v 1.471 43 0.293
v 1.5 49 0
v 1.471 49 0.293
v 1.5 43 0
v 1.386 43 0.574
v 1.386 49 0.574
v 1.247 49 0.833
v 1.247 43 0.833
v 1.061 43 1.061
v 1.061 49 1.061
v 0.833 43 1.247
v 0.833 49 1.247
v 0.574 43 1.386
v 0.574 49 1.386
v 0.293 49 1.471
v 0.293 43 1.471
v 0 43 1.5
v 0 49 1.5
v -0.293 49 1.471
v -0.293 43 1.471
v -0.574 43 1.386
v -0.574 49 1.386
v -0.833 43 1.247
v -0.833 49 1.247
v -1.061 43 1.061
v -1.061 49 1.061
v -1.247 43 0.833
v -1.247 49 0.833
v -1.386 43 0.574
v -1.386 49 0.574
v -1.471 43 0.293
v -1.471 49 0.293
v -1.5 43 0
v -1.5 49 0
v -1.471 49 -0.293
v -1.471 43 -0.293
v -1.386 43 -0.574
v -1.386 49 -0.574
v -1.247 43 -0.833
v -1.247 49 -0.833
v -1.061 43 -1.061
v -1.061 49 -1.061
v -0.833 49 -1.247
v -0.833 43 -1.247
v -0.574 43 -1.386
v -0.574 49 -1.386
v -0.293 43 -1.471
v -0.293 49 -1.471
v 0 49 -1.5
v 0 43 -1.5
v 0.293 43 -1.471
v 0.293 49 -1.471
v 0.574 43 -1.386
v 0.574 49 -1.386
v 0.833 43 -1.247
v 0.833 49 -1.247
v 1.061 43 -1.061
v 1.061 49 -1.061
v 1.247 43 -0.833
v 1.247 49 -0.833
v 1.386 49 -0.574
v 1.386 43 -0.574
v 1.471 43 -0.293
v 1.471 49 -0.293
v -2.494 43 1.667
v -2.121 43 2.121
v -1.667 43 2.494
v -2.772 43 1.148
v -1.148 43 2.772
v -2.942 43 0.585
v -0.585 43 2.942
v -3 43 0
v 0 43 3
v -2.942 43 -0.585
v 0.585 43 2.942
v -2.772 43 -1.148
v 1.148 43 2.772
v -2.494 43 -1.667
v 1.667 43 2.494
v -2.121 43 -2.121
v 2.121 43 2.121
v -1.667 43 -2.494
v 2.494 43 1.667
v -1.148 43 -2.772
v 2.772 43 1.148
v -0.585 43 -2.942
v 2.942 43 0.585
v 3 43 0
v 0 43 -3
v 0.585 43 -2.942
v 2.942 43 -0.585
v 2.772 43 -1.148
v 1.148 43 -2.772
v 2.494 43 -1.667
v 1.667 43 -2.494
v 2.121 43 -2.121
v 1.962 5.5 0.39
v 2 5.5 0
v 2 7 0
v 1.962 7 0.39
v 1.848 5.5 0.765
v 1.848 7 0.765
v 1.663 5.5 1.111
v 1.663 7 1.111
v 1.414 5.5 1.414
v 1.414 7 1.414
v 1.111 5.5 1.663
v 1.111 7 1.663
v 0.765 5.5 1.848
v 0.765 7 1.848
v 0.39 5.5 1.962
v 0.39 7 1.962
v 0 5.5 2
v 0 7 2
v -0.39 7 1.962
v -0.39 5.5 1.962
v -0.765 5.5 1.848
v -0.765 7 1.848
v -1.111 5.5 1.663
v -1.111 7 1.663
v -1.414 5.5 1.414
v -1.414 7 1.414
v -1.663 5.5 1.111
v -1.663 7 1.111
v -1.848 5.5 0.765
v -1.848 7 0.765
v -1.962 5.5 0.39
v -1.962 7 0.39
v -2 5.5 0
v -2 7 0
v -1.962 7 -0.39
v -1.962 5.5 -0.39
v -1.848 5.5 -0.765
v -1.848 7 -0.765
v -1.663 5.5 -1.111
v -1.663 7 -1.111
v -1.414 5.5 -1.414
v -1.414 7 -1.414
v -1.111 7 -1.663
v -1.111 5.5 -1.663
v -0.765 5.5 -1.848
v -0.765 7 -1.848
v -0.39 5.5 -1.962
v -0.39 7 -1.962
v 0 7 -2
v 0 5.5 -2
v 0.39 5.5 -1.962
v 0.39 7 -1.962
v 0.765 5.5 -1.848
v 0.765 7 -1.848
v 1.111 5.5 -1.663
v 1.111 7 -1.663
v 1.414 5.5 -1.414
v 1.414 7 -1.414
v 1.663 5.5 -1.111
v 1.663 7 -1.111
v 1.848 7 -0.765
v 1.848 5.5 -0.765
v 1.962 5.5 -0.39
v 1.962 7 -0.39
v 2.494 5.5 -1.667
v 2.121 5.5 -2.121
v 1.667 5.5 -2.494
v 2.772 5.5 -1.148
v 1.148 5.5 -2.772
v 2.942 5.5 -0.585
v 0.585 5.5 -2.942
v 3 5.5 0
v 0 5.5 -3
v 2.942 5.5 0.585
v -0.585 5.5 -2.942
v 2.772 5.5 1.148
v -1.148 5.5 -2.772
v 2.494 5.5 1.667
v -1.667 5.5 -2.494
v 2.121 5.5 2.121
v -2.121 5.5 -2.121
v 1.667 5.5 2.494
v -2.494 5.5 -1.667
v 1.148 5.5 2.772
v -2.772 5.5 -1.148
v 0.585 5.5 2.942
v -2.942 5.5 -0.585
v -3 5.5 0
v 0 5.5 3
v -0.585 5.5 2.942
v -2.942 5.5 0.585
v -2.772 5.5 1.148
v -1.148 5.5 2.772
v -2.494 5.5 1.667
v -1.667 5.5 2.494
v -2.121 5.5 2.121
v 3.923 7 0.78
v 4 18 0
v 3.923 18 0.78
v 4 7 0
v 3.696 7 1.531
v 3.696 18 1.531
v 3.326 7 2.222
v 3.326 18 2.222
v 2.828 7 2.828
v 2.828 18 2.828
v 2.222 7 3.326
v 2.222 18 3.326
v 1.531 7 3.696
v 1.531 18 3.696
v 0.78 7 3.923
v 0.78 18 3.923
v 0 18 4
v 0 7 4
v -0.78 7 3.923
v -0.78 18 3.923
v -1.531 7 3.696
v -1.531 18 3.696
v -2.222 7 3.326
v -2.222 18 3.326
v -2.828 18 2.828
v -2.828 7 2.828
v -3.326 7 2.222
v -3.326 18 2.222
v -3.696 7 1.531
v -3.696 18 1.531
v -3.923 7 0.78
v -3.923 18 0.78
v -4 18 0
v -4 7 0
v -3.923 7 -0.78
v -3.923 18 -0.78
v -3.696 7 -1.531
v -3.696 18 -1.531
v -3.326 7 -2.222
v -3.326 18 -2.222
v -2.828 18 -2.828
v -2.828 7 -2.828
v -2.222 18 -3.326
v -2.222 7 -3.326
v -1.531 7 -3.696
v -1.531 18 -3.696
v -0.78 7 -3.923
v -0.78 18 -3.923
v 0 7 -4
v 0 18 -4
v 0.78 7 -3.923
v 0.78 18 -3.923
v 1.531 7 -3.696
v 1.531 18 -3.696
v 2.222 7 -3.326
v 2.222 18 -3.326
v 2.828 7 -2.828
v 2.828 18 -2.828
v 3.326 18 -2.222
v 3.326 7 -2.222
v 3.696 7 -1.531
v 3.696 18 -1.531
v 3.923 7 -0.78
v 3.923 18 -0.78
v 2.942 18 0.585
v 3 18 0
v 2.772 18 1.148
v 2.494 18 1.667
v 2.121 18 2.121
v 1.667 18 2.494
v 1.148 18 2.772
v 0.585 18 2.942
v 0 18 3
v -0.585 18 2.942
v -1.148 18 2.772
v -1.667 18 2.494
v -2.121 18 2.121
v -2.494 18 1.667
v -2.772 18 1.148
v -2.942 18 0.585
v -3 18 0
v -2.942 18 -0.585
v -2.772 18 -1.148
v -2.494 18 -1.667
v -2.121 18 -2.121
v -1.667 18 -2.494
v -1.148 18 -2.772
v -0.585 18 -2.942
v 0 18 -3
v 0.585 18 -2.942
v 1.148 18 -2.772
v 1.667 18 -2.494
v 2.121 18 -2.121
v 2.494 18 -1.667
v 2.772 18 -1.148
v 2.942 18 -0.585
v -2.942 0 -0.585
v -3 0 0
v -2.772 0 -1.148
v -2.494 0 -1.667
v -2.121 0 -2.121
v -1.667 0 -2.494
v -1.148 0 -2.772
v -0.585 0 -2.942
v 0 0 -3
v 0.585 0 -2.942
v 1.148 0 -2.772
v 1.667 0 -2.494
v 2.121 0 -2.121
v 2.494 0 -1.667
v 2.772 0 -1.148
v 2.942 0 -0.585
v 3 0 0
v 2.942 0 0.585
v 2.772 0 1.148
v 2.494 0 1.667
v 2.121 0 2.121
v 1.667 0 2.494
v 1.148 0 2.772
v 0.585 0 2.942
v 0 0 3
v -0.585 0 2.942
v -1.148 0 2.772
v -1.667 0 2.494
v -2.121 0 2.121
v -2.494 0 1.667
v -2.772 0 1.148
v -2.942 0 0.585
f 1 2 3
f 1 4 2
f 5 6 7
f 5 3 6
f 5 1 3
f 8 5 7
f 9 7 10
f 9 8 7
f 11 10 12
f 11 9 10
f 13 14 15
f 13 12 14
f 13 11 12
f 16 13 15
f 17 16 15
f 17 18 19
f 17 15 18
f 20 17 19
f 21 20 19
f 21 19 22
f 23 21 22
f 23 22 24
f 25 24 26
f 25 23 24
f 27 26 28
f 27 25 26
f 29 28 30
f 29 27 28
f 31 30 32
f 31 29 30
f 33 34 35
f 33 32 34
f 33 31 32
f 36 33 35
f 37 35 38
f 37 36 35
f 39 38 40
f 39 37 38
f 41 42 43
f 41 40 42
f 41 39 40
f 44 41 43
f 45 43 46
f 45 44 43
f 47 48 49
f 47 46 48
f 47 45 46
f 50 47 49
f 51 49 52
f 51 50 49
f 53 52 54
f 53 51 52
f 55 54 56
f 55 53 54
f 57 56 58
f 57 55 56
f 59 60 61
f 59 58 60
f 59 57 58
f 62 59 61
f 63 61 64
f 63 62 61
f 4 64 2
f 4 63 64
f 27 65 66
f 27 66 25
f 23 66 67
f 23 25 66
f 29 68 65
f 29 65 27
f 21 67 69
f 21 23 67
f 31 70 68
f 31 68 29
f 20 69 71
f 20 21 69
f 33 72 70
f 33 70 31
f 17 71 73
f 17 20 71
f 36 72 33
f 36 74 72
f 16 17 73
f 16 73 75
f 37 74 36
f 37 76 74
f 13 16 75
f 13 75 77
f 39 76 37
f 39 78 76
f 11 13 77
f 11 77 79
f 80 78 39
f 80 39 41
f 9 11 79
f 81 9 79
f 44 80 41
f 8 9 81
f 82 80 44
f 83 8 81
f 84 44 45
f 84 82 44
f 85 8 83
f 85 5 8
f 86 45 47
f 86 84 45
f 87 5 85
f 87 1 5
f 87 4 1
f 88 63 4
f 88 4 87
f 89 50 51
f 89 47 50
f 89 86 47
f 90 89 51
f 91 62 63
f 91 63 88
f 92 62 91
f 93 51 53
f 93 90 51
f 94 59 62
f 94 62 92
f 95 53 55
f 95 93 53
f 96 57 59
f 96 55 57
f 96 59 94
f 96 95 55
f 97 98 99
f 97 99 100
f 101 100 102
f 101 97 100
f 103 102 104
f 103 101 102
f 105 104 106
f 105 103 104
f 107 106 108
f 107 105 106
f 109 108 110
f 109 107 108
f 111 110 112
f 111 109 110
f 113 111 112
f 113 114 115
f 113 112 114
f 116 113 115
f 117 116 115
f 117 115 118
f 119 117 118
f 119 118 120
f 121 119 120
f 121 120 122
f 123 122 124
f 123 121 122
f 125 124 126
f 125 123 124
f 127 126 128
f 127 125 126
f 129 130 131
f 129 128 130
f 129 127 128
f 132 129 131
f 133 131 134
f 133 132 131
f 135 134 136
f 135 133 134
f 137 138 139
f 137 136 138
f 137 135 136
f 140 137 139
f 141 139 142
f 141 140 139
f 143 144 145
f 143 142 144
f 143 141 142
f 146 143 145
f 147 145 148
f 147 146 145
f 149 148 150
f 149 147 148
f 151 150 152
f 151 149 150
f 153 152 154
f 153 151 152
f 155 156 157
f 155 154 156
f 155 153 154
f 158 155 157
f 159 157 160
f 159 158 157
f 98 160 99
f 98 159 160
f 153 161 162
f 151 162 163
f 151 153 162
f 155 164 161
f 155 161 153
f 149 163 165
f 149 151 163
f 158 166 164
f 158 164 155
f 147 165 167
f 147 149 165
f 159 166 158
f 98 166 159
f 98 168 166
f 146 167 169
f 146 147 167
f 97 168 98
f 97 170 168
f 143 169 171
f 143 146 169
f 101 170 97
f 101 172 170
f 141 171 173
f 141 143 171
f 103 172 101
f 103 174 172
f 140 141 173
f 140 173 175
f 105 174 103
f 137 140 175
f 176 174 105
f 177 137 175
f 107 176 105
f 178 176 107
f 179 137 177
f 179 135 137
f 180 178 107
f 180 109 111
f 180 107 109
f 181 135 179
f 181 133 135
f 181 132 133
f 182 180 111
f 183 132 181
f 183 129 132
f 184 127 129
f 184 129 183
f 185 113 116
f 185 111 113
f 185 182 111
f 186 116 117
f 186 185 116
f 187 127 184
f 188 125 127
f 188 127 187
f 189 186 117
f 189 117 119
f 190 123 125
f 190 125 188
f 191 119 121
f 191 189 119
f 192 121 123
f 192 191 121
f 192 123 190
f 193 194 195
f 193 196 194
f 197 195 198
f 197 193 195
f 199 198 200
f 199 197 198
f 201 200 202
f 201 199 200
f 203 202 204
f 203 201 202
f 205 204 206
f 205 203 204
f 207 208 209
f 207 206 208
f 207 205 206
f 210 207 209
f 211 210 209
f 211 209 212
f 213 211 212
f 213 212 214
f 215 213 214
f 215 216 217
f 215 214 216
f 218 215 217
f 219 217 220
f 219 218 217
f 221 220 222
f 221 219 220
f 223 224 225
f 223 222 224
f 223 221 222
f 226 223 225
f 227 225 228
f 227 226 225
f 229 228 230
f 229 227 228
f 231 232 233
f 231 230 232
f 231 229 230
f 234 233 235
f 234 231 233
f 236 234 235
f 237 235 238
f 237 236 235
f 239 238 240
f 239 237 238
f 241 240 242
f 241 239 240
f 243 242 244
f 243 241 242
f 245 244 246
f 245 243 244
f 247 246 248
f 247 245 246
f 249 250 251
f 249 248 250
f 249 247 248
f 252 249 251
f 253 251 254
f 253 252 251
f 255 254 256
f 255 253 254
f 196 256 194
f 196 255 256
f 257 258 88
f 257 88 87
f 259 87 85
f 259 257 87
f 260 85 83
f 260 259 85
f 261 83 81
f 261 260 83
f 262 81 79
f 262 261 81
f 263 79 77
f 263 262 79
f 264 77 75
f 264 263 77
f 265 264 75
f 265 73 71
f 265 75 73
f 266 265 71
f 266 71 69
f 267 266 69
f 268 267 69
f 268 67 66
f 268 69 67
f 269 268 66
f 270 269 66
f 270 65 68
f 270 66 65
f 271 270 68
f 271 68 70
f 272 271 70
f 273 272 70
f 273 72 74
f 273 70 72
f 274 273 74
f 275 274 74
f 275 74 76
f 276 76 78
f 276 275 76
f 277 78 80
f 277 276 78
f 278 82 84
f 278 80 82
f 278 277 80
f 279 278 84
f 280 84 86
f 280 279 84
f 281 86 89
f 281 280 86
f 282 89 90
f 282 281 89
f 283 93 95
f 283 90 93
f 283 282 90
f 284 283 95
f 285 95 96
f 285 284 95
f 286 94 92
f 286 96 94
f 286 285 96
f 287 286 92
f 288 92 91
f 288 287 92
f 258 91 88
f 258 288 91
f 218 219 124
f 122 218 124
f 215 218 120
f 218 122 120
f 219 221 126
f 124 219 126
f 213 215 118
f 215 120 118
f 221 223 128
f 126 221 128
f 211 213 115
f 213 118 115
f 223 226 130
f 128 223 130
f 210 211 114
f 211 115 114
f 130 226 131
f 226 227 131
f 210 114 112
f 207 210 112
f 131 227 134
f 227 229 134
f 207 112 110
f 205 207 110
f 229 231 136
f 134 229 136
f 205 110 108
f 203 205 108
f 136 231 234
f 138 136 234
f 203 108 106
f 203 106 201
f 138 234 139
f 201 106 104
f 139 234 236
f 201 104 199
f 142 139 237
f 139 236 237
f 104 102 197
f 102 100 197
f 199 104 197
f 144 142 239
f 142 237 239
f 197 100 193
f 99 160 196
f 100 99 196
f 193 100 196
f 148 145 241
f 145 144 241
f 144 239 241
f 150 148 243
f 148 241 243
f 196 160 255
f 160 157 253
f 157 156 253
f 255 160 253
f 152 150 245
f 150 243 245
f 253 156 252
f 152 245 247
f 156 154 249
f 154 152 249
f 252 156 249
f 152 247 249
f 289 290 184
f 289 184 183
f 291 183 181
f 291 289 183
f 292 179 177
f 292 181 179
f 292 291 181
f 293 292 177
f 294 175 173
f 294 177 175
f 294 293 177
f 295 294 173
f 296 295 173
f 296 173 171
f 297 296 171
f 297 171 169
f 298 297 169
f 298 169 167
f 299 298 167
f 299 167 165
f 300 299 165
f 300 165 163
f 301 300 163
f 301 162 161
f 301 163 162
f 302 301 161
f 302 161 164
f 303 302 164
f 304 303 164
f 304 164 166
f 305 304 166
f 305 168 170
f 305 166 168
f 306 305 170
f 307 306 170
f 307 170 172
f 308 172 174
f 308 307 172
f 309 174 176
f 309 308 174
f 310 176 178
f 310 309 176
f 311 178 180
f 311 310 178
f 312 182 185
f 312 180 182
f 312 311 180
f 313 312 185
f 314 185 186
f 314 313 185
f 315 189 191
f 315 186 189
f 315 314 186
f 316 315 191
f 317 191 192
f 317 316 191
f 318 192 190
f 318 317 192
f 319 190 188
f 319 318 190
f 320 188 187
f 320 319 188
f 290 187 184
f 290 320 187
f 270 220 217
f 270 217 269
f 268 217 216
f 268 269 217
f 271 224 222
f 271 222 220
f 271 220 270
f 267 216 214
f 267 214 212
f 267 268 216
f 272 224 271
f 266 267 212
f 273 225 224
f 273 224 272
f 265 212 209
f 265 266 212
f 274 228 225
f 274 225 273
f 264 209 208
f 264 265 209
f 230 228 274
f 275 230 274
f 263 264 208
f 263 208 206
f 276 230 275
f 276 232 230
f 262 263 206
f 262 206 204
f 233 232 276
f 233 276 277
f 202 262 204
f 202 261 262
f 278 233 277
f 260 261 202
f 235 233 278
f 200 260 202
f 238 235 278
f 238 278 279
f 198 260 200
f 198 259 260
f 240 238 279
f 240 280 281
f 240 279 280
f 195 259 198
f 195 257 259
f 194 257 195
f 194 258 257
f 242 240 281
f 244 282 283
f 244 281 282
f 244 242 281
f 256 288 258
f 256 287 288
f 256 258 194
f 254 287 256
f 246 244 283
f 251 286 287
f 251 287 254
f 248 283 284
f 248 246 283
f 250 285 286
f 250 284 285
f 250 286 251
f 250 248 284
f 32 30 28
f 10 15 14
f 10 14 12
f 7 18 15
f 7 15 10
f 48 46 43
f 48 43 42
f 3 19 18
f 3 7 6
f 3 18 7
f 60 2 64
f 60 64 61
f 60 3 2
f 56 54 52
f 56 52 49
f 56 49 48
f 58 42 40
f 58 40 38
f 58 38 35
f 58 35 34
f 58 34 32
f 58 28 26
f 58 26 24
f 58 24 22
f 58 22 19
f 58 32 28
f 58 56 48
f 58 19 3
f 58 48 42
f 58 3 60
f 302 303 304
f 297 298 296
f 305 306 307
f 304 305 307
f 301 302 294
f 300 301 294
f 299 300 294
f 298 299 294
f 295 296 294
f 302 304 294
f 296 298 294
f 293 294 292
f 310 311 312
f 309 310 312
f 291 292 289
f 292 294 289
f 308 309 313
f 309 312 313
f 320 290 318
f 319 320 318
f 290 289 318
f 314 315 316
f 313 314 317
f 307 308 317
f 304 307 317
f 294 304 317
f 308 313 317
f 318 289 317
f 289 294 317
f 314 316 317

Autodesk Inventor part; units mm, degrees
ref_plane "YZ Plane" through (0, 0, 0) normal (1, 0, 0) x (0, 1, 0)
ref_plane "XZ Plane" through (0, 0, 0) normal (0, 1, 0) x (-1, 0, 0)
ref_plane "XY Plane" through (0, 0, 0) normal (0, 0, 1) x (1, 0, 0)
sketch "Sketch1" plane through (0, 0, 0) normal (0, 1, 0) x (-1, 0, 0)
  circle A0 centre (0, 0) radius 3
  dimension "d0" = 6
extrude "Extrusion1" add sketch "Sketch1" along normal blind 5.5
sketch "Sketch2" plane through (0, 5.5, 0) normal (0, 1, 0) x (1, 0, 0)
  circle A0 centre (0, 0) radius 2
  dimension "d3" = 4
extrude "Extrusion2" add sketch "Sketch2" along normal blind 1.5
sketch "Sketch3" plane through (0, 7, 0) normal (0, 1, 0) x (1, 0, 0)
  circle A0 centre (0, 0) radius 4
  dimension "d6" = 8
extrude "Extrusion3" add sketch "Sketch3" along normal blind 11
sketch "Sketch4" plane through (0, 18, 0) normal (0, 1, 0) x (1, 0, 0)
  circle A0 centre (0, 0) radius 3
  dimension "d9" = 6
extrude "Extrusion4" add sketch "Sketch4" along normal blind 25
sketch "Sketch5" plane through (0, 43, 0) normal (0, 1, 0) x (1, 0, 0)
  circle A0 centre (0, 0) radius 3 projected
  circle A1 centre (0, 0) radius 1.5
  dimension "d12" = 3
extrude "Extrusion5" add sketch "Sketch5" along normal blind 6 contours A1
thread "Thread1" size "M6x1" class "6g" standard "ANSI Metric M Profile" full length
properties part number "reverse gear lever ring stud"
